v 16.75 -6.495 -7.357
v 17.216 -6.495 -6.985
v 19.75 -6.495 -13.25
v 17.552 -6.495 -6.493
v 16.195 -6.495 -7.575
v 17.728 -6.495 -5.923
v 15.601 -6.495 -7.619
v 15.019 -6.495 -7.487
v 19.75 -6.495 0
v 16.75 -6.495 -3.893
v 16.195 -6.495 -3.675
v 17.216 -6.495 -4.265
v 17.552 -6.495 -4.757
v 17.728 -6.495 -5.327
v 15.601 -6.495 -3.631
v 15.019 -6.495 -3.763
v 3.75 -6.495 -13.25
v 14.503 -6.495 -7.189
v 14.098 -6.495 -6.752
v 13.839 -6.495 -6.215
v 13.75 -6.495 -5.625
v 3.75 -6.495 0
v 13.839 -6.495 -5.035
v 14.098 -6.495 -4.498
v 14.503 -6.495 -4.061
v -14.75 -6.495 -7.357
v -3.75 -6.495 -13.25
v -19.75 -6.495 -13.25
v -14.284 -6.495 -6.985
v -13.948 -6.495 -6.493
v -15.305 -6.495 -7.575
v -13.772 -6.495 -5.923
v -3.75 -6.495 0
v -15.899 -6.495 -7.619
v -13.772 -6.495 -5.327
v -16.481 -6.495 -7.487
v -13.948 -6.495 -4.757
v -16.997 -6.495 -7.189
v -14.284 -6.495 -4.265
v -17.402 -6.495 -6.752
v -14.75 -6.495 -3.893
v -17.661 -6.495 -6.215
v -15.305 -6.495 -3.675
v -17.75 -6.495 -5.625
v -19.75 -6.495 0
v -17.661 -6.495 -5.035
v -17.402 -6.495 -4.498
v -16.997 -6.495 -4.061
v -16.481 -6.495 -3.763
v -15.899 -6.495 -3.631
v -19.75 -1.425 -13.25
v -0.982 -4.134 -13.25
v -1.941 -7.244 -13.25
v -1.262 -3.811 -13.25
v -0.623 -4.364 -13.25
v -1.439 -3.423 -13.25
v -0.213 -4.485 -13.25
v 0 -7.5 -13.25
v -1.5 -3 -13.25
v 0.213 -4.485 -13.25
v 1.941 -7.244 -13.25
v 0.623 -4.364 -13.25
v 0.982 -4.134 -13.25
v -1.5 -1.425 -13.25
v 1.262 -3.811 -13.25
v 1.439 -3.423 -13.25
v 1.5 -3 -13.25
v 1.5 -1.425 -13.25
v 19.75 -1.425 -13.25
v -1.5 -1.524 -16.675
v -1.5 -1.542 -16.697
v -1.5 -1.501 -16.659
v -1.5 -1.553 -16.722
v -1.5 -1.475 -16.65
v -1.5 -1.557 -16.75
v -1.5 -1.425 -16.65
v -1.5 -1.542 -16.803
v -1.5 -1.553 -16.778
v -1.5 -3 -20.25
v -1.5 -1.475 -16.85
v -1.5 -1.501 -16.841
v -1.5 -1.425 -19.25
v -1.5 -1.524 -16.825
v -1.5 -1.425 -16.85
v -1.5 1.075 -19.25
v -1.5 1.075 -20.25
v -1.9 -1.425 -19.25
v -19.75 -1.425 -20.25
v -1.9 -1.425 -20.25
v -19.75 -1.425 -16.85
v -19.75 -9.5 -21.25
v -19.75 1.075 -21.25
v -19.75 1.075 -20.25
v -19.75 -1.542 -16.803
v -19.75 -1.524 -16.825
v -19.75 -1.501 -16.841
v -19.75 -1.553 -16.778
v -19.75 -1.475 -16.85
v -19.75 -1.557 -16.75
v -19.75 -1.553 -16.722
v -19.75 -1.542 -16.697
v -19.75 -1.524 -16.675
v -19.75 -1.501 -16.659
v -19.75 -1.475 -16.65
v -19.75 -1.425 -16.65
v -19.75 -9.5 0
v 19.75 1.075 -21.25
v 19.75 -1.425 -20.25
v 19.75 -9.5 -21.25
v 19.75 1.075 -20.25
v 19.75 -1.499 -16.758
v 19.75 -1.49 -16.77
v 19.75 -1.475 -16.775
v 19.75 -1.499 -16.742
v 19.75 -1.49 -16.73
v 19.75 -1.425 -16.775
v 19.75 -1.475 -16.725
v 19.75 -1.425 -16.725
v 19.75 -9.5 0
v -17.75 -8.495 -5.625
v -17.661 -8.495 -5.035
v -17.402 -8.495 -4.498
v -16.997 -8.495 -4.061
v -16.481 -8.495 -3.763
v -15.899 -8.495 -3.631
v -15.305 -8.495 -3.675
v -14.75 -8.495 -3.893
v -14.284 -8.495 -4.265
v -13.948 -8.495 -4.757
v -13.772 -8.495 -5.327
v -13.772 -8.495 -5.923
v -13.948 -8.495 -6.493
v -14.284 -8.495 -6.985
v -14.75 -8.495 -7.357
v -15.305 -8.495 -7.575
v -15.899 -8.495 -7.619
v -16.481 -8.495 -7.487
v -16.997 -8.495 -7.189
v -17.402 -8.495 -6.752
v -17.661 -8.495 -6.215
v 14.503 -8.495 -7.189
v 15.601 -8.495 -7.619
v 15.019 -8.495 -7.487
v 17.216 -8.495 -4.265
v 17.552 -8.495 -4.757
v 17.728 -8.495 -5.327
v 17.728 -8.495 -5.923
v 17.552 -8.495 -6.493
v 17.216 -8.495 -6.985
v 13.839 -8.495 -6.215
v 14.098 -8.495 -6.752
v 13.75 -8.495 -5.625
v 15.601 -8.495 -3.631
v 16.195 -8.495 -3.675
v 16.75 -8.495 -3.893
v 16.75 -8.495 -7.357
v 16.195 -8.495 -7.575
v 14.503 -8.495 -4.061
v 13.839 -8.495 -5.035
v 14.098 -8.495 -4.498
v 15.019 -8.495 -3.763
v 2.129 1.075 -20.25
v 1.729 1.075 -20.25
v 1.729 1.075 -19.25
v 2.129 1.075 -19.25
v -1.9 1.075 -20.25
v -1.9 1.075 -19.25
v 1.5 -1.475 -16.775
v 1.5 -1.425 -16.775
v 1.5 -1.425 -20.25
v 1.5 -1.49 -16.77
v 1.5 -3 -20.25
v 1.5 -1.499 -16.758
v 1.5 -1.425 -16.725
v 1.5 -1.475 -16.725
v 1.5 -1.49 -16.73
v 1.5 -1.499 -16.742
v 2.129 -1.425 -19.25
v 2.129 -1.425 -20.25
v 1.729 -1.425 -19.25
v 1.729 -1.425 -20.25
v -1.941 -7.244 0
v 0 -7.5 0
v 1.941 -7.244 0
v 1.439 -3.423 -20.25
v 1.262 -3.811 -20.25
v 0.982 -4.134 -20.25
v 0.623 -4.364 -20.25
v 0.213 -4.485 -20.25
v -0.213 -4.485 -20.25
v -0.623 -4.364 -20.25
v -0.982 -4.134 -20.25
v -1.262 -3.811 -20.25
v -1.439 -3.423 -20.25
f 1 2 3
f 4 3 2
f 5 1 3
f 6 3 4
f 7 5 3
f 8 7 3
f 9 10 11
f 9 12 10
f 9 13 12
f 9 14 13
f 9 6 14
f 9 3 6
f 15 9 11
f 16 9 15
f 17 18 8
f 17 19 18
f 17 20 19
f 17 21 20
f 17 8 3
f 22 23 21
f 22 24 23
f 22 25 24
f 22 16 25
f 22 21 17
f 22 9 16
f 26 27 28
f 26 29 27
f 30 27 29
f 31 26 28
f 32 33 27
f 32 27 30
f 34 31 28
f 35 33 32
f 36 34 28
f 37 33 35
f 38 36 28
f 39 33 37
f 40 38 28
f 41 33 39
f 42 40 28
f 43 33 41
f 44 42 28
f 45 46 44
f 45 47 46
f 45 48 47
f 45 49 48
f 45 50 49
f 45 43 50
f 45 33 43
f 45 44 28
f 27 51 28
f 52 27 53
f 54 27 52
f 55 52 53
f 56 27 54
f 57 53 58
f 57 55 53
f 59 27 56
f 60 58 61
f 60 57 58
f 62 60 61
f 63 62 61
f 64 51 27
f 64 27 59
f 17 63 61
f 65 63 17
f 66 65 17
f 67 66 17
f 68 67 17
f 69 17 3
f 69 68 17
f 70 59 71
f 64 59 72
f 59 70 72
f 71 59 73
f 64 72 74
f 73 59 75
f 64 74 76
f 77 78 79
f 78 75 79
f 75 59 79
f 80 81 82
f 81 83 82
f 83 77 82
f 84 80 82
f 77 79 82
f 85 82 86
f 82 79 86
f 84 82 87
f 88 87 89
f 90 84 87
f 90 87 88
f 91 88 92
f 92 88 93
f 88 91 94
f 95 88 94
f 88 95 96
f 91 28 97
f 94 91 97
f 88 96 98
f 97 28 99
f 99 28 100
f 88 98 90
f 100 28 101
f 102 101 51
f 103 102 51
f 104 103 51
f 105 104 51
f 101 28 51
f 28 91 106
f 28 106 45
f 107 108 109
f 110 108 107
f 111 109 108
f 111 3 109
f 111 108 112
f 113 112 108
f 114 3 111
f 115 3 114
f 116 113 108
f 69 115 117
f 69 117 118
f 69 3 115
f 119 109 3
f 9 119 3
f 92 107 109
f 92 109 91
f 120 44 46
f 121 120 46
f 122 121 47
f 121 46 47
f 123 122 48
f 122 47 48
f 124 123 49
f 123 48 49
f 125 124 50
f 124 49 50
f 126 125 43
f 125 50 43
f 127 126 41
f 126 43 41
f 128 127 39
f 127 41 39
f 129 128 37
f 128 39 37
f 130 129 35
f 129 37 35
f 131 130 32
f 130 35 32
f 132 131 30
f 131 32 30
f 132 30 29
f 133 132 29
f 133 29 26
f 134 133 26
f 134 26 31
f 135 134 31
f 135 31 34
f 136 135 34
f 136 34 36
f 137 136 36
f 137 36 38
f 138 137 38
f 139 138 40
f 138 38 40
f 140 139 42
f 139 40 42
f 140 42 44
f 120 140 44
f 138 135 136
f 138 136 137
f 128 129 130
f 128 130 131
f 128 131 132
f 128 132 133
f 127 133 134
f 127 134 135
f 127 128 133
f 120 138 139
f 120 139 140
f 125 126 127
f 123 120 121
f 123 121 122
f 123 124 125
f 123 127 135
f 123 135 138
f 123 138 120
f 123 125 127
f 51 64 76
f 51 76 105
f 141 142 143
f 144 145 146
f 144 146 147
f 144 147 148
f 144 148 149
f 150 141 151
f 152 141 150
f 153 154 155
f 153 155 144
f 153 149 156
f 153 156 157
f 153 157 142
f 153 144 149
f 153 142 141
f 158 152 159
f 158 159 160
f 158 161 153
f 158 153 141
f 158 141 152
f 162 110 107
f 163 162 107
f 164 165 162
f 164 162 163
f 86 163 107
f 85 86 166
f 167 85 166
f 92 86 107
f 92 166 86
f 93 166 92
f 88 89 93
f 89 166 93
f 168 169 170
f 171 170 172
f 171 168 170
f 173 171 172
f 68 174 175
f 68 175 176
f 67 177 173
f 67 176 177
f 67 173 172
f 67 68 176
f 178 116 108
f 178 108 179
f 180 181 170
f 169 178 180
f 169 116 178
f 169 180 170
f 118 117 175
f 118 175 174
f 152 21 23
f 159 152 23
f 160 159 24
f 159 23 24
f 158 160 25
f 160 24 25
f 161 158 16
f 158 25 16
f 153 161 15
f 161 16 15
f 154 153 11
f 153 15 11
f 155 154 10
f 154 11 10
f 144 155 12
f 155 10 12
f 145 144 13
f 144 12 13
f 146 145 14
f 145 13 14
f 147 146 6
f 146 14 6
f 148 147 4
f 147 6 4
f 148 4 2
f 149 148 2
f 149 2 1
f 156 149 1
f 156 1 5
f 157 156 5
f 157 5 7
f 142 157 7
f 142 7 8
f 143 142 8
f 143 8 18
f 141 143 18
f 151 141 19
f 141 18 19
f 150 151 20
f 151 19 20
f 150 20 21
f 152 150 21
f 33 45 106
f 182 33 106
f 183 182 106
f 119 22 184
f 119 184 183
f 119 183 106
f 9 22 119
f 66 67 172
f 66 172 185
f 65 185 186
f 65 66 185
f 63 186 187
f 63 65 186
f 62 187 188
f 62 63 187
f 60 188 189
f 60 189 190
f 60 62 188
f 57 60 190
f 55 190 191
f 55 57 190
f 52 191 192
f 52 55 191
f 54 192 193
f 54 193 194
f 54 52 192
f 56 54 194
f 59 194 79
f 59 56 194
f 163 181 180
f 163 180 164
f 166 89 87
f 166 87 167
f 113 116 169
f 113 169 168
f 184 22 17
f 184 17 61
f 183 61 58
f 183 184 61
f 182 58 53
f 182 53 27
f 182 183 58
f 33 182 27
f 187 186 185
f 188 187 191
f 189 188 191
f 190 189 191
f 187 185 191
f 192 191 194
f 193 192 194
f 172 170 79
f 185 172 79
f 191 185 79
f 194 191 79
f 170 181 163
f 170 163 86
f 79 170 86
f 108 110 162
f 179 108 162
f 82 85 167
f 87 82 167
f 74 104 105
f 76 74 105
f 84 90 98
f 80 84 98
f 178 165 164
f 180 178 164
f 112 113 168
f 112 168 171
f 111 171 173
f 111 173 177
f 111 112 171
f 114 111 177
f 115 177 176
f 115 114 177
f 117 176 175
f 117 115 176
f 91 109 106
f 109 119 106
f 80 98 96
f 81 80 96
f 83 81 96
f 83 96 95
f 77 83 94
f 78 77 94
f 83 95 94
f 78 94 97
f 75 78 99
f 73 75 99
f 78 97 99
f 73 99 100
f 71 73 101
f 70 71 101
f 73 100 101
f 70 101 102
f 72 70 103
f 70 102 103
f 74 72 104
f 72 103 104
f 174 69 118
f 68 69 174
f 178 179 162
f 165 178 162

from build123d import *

# Parameters (mm, degrees)
MOTOR_HOLDER_BODY_EXTRUDE_DEPTH          = 13.25
ROLLER_HOLDER_BODY_EXTRUDE_DEPTH         = 7
ALIGNER_4_W                              = 0.4
ALIGNER_4_H                              = 2.5
ALIGNMENT_RAIL_EXTRUDE_DEPTH             = 1
ALIGNER_W                                = 39.5
ALIGNER_H                                = 10.575
ALIGNMENT_WALL_EXTRUDE_DEPTH             = 1
ELECTRODE_GROOVE_CUT_EXTRUDE_DEPTH       = 18.25
FIBRE_GROOVE_CUT_EXTRUDE_DEPTH           = 18.25
ADJUSTMENT_SCREW_HOLES_R                 = 2
ADJUSTMENT_SCREW_HOLES_CUT_EXTRUDE_DEPTH = 2


with BuildPart() as part:
    # MOTOR HOLDER → Motor Holder Body Extrude (new body)
    with BuildSketch(Plane.XY):
        with BuildLine():
            Line((-19.75, -9.5), (19.75, -9.5))
            Line((19.75, -9.5), (19.75, -6.495190528))
            Line((19.75, -6.495190528), (3.75, -6.495190528))
            ThreePointArc((3.75, -6.495190528), (0, -7.5), (-3.75, -6.495190528))
            Line((-3.75, -6.495190528), (-19.75, -6.495190528))
            Line((-19.75, -6.495190528), (-19.75, -9.5))
        make_face()
    extrude(amount=-MOTOR_HOLDER_BODY_EXTRUDE_DEPTH)

    # ROLLER HOLDER → Roller Holder Body Extrude (add)
    with BuildSketch(Plane(origin=(0, 0, -13.25), x_dir=(-1, 0, 0), z_dir=(0, 0, -1))):
        with BuildLine():
            Line((19.75, -9.5), (-19.75, -9.5))
            Line((-19.75, -9.5), (-19.75, -1.425))
            Line((-19.75, -1.425), (-1.5, -1.425))
            Line((-1.5, -1.425), (-1.5, -3))
            ThreePointArc((-1.5, -3), (0, -4.5), (1.5, -3))
            Line((1.5, -3), (1.5, -1.425))
            Line((1.5, -1.425), (19.75, -1.425))
            Line((19.75, -1.425), (19.75, -9.5))
        make_face()
    extrude(amount=ROLLER_HOLDER_BODY_EXTRUDE_DEPTH)

    # ALIGNER<4> → Alignment Rail Extrude (add)
    with BuildSketch(Plane(origin=(0, 0, -20.25), x_dir=(-1, 0, 0), z_dir=(0, 0, -1))):
        with Locations((1.7, -0.175)):
            Rectangle(ALIGNER_4_W, ALIGNER_4_H)
        with Locations((-1.929199775, -0.175)):
            Rectangle(ALIGNER_4_W, ALIGNER_4_H)
    extrude(amount=-ALIGNMENT_RAIL_EXTRUDE_DEPTH)

    # ALIGNER → Alignment Wall Extrude (add)
    with BuildSketch(Plane(origin=(0, 0, -20.25), x_dir=(-1, 0, 0), z_dir=(0, 0, -1))):
        with Locations((0, -4.2125)):
            Rectangle(ALIGNER_W, ALIGNER_H)
    extrude(amount=ALIGNMENT_WALL_EXTRUDE_DEPTH)

    # ELECTRODE GROOVE → Electrode Groove Cut Extrude (cut)
    with BuildSketch(Plane(origin=(19.75, 0, 0), x_dir=(0, 0, -1), z_dir=(1, 0, 0))):
        with BuildLine():
            Line((16.725, -1.425), (16.775, -1.425))
            Line((16.775, -1.425), (16.775, -1.475))
            ThreePointArc((16.775, -1.475), (16.75, -1.5), (16.725, -1.475))
            Line((16.725, -1.475), (16.725, -1.425))
        make_face()
    extrude(amount=-ELECTRODE_GROOVE_CUT_EXTRUDE_DEPTH, mode=Mode.SUBTRACT)

    # FIBRE GROOVE → Fibre Groove Cut Extrude (cut)
    with BuildSketch(Plane.ZY.offset(19.75)):
        with BuildLine():
            Line((-16.85, -1.425), (-16.85, -1.475))
            ThreePointArc((-16.85, -1.475), (-16.75, -1.55698039), (-16.65, -1.475))
            Line((-16.65, -1.475), (-16.65, -1.425))
            Line((-16.65, -1.425), (-16.85, -1.425))
        make_face()
    extrude(amount=-FIBRE_GROOVE_CUT_EXTRUDE_DEPTH, mode=Mode.SUBTRACT)

    # ADJUSTMENT SCREW HOLES → Adjustment Screw Holes Cut Extrude (cut)
    with BuildSketch(Plane(origin=(0, -6.495190528, 0), x_dir=(1, 0, 0), z_dir=(0, 1, 0))):
        with Locations(Location((-15.75, 5.625, 0), (0, 0, 180))):
            Circle(ADJUSTMENT_SCREW_HOLES_R)
        with Locations(Location((15.75, 5.625, 0), (0, 0, 180))):
            Circle(ADJUSTMENT_SCREW_HOLES_R)
    extrude(amount=-ADJUSTMENT_SCREW_HOLES_CUT_EXTRUDE_DEPTH, mode=Mode.SUBTRACT)


solid = part.part
